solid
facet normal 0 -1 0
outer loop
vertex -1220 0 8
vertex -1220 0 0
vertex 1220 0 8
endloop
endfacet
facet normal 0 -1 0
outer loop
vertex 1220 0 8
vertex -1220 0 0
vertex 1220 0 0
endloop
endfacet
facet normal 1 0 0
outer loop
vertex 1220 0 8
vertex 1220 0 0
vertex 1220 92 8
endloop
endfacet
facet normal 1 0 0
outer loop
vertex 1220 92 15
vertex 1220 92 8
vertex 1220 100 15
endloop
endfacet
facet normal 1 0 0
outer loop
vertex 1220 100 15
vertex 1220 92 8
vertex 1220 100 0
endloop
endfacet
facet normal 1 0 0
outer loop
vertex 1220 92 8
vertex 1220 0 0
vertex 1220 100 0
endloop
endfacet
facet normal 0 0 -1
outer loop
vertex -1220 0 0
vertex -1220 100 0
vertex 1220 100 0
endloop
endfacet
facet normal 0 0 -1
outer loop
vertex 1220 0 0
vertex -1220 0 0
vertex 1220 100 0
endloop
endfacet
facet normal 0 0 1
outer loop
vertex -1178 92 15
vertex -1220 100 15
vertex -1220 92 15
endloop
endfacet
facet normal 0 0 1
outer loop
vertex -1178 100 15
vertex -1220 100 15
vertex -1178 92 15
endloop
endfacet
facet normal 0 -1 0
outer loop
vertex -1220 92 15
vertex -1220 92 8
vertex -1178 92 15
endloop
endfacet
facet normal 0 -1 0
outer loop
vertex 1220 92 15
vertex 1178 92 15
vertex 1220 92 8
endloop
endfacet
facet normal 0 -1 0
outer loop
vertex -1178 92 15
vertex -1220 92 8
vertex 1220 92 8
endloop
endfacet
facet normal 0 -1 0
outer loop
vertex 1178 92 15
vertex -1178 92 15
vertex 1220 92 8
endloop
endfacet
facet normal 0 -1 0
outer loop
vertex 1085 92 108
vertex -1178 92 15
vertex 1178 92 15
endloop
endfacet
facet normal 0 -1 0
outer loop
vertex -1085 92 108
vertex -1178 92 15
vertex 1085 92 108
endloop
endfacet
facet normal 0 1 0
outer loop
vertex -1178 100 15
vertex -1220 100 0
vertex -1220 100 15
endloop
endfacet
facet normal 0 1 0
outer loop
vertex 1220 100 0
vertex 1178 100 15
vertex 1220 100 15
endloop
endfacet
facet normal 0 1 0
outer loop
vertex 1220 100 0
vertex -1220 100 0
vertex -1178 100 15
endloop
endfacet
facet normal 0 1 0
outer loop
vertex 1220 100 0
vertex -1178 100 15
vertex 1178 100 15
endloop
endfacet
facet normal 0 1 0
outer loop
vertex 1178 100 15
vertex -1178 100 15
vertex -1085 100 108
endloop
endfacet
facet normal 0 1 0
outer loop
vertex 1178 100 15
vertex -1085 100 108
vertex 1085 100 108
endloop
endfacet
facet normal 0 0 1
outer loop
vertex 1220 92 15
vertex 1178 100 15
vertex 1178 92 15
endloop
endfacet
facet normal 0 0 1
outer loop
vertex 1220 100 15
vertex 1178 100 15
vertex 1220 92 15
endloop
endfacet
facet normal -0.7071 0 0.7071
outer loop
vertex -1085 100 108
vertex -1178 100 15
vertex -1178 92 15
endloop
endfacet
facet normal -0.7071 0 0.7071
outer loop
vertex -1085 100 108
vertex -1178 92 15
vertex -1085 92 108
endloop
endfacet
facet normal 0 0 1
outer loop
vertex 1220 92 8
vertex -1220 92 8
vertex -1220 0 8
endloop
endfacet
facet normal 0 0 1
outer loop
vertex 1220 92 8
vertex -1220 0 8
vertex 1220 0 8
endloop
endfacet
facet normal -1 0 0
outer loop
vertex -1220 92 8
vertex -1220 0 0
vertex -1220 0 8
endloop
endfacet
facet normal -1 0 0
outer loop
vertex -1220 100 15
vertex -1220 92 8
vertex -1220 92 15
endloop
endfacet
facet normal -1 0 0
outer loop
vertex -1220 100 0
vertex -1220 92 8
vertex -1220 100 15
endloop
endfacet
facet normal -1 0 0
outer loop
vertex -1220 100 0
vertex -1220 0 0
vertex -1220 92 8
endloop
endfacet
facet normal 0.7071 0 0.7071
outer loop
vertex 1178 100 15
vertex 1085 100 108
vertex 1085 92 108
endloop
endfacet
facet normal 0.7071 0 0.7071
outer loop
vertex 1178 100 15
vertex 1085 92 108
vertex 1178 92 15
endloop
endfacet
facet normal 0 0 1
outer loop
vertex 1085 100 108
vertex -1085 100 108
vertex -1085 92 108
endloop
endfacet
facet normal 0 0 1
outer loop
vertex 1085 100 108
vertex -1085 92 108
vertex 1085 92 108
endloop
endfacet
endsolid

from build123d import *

# Parameters (mm, degrees)
SKETCH_1_W          = 2440
SKETCH_1_H          = 100
EXTRUDE_715_DEPTH   = 8
SKETCH_2_W          = 2440
SKETCH_2_H          = 8
EXTRUDE_1_DEPTH     = 100
CUT_EXTRUDE_1_DEPTH = 1229.846613699


with BuildPart() as part:
    # 草图1 → Extrude 715 (new body)
    with BuildSketch(Plane.XY):
        with Locations((0, 50)):
            Rectangle(SKETCH_1_W, SKETCH_1_H)
    extrude(amount=EXTRUDE_715_DEPTH)

    # 草图2 → 凸台-拉伸1 (add)
    with BuildSketch(Plane.XY.offset(8)):
        with Locations((0, 96)):
            Rectangle(SKETCH_2_W, SKETCH_2_H)
    extrude(amount=EXTRUDE_1_DEPTH)

    # 草图3 → 切除-拉伸1 (cut, through all)
    with BuildSketch(Plane(origin=(0, 100, 0), x_dir=(-1, 0, 0), z_dir=(0, 1, 0))):
        Polygon((-1085, 108), (-1178, 15), (-1220, 15), (-1220, 108), align=None)
        Polygon((1220, 15), (1178, 15), (1085, 108), (1220, 108), align=None)
    extrude(amount=-CUT_EXTRUDE_1_DEPTH, mode=Mode.SUBTRACT)


solid = part.part
